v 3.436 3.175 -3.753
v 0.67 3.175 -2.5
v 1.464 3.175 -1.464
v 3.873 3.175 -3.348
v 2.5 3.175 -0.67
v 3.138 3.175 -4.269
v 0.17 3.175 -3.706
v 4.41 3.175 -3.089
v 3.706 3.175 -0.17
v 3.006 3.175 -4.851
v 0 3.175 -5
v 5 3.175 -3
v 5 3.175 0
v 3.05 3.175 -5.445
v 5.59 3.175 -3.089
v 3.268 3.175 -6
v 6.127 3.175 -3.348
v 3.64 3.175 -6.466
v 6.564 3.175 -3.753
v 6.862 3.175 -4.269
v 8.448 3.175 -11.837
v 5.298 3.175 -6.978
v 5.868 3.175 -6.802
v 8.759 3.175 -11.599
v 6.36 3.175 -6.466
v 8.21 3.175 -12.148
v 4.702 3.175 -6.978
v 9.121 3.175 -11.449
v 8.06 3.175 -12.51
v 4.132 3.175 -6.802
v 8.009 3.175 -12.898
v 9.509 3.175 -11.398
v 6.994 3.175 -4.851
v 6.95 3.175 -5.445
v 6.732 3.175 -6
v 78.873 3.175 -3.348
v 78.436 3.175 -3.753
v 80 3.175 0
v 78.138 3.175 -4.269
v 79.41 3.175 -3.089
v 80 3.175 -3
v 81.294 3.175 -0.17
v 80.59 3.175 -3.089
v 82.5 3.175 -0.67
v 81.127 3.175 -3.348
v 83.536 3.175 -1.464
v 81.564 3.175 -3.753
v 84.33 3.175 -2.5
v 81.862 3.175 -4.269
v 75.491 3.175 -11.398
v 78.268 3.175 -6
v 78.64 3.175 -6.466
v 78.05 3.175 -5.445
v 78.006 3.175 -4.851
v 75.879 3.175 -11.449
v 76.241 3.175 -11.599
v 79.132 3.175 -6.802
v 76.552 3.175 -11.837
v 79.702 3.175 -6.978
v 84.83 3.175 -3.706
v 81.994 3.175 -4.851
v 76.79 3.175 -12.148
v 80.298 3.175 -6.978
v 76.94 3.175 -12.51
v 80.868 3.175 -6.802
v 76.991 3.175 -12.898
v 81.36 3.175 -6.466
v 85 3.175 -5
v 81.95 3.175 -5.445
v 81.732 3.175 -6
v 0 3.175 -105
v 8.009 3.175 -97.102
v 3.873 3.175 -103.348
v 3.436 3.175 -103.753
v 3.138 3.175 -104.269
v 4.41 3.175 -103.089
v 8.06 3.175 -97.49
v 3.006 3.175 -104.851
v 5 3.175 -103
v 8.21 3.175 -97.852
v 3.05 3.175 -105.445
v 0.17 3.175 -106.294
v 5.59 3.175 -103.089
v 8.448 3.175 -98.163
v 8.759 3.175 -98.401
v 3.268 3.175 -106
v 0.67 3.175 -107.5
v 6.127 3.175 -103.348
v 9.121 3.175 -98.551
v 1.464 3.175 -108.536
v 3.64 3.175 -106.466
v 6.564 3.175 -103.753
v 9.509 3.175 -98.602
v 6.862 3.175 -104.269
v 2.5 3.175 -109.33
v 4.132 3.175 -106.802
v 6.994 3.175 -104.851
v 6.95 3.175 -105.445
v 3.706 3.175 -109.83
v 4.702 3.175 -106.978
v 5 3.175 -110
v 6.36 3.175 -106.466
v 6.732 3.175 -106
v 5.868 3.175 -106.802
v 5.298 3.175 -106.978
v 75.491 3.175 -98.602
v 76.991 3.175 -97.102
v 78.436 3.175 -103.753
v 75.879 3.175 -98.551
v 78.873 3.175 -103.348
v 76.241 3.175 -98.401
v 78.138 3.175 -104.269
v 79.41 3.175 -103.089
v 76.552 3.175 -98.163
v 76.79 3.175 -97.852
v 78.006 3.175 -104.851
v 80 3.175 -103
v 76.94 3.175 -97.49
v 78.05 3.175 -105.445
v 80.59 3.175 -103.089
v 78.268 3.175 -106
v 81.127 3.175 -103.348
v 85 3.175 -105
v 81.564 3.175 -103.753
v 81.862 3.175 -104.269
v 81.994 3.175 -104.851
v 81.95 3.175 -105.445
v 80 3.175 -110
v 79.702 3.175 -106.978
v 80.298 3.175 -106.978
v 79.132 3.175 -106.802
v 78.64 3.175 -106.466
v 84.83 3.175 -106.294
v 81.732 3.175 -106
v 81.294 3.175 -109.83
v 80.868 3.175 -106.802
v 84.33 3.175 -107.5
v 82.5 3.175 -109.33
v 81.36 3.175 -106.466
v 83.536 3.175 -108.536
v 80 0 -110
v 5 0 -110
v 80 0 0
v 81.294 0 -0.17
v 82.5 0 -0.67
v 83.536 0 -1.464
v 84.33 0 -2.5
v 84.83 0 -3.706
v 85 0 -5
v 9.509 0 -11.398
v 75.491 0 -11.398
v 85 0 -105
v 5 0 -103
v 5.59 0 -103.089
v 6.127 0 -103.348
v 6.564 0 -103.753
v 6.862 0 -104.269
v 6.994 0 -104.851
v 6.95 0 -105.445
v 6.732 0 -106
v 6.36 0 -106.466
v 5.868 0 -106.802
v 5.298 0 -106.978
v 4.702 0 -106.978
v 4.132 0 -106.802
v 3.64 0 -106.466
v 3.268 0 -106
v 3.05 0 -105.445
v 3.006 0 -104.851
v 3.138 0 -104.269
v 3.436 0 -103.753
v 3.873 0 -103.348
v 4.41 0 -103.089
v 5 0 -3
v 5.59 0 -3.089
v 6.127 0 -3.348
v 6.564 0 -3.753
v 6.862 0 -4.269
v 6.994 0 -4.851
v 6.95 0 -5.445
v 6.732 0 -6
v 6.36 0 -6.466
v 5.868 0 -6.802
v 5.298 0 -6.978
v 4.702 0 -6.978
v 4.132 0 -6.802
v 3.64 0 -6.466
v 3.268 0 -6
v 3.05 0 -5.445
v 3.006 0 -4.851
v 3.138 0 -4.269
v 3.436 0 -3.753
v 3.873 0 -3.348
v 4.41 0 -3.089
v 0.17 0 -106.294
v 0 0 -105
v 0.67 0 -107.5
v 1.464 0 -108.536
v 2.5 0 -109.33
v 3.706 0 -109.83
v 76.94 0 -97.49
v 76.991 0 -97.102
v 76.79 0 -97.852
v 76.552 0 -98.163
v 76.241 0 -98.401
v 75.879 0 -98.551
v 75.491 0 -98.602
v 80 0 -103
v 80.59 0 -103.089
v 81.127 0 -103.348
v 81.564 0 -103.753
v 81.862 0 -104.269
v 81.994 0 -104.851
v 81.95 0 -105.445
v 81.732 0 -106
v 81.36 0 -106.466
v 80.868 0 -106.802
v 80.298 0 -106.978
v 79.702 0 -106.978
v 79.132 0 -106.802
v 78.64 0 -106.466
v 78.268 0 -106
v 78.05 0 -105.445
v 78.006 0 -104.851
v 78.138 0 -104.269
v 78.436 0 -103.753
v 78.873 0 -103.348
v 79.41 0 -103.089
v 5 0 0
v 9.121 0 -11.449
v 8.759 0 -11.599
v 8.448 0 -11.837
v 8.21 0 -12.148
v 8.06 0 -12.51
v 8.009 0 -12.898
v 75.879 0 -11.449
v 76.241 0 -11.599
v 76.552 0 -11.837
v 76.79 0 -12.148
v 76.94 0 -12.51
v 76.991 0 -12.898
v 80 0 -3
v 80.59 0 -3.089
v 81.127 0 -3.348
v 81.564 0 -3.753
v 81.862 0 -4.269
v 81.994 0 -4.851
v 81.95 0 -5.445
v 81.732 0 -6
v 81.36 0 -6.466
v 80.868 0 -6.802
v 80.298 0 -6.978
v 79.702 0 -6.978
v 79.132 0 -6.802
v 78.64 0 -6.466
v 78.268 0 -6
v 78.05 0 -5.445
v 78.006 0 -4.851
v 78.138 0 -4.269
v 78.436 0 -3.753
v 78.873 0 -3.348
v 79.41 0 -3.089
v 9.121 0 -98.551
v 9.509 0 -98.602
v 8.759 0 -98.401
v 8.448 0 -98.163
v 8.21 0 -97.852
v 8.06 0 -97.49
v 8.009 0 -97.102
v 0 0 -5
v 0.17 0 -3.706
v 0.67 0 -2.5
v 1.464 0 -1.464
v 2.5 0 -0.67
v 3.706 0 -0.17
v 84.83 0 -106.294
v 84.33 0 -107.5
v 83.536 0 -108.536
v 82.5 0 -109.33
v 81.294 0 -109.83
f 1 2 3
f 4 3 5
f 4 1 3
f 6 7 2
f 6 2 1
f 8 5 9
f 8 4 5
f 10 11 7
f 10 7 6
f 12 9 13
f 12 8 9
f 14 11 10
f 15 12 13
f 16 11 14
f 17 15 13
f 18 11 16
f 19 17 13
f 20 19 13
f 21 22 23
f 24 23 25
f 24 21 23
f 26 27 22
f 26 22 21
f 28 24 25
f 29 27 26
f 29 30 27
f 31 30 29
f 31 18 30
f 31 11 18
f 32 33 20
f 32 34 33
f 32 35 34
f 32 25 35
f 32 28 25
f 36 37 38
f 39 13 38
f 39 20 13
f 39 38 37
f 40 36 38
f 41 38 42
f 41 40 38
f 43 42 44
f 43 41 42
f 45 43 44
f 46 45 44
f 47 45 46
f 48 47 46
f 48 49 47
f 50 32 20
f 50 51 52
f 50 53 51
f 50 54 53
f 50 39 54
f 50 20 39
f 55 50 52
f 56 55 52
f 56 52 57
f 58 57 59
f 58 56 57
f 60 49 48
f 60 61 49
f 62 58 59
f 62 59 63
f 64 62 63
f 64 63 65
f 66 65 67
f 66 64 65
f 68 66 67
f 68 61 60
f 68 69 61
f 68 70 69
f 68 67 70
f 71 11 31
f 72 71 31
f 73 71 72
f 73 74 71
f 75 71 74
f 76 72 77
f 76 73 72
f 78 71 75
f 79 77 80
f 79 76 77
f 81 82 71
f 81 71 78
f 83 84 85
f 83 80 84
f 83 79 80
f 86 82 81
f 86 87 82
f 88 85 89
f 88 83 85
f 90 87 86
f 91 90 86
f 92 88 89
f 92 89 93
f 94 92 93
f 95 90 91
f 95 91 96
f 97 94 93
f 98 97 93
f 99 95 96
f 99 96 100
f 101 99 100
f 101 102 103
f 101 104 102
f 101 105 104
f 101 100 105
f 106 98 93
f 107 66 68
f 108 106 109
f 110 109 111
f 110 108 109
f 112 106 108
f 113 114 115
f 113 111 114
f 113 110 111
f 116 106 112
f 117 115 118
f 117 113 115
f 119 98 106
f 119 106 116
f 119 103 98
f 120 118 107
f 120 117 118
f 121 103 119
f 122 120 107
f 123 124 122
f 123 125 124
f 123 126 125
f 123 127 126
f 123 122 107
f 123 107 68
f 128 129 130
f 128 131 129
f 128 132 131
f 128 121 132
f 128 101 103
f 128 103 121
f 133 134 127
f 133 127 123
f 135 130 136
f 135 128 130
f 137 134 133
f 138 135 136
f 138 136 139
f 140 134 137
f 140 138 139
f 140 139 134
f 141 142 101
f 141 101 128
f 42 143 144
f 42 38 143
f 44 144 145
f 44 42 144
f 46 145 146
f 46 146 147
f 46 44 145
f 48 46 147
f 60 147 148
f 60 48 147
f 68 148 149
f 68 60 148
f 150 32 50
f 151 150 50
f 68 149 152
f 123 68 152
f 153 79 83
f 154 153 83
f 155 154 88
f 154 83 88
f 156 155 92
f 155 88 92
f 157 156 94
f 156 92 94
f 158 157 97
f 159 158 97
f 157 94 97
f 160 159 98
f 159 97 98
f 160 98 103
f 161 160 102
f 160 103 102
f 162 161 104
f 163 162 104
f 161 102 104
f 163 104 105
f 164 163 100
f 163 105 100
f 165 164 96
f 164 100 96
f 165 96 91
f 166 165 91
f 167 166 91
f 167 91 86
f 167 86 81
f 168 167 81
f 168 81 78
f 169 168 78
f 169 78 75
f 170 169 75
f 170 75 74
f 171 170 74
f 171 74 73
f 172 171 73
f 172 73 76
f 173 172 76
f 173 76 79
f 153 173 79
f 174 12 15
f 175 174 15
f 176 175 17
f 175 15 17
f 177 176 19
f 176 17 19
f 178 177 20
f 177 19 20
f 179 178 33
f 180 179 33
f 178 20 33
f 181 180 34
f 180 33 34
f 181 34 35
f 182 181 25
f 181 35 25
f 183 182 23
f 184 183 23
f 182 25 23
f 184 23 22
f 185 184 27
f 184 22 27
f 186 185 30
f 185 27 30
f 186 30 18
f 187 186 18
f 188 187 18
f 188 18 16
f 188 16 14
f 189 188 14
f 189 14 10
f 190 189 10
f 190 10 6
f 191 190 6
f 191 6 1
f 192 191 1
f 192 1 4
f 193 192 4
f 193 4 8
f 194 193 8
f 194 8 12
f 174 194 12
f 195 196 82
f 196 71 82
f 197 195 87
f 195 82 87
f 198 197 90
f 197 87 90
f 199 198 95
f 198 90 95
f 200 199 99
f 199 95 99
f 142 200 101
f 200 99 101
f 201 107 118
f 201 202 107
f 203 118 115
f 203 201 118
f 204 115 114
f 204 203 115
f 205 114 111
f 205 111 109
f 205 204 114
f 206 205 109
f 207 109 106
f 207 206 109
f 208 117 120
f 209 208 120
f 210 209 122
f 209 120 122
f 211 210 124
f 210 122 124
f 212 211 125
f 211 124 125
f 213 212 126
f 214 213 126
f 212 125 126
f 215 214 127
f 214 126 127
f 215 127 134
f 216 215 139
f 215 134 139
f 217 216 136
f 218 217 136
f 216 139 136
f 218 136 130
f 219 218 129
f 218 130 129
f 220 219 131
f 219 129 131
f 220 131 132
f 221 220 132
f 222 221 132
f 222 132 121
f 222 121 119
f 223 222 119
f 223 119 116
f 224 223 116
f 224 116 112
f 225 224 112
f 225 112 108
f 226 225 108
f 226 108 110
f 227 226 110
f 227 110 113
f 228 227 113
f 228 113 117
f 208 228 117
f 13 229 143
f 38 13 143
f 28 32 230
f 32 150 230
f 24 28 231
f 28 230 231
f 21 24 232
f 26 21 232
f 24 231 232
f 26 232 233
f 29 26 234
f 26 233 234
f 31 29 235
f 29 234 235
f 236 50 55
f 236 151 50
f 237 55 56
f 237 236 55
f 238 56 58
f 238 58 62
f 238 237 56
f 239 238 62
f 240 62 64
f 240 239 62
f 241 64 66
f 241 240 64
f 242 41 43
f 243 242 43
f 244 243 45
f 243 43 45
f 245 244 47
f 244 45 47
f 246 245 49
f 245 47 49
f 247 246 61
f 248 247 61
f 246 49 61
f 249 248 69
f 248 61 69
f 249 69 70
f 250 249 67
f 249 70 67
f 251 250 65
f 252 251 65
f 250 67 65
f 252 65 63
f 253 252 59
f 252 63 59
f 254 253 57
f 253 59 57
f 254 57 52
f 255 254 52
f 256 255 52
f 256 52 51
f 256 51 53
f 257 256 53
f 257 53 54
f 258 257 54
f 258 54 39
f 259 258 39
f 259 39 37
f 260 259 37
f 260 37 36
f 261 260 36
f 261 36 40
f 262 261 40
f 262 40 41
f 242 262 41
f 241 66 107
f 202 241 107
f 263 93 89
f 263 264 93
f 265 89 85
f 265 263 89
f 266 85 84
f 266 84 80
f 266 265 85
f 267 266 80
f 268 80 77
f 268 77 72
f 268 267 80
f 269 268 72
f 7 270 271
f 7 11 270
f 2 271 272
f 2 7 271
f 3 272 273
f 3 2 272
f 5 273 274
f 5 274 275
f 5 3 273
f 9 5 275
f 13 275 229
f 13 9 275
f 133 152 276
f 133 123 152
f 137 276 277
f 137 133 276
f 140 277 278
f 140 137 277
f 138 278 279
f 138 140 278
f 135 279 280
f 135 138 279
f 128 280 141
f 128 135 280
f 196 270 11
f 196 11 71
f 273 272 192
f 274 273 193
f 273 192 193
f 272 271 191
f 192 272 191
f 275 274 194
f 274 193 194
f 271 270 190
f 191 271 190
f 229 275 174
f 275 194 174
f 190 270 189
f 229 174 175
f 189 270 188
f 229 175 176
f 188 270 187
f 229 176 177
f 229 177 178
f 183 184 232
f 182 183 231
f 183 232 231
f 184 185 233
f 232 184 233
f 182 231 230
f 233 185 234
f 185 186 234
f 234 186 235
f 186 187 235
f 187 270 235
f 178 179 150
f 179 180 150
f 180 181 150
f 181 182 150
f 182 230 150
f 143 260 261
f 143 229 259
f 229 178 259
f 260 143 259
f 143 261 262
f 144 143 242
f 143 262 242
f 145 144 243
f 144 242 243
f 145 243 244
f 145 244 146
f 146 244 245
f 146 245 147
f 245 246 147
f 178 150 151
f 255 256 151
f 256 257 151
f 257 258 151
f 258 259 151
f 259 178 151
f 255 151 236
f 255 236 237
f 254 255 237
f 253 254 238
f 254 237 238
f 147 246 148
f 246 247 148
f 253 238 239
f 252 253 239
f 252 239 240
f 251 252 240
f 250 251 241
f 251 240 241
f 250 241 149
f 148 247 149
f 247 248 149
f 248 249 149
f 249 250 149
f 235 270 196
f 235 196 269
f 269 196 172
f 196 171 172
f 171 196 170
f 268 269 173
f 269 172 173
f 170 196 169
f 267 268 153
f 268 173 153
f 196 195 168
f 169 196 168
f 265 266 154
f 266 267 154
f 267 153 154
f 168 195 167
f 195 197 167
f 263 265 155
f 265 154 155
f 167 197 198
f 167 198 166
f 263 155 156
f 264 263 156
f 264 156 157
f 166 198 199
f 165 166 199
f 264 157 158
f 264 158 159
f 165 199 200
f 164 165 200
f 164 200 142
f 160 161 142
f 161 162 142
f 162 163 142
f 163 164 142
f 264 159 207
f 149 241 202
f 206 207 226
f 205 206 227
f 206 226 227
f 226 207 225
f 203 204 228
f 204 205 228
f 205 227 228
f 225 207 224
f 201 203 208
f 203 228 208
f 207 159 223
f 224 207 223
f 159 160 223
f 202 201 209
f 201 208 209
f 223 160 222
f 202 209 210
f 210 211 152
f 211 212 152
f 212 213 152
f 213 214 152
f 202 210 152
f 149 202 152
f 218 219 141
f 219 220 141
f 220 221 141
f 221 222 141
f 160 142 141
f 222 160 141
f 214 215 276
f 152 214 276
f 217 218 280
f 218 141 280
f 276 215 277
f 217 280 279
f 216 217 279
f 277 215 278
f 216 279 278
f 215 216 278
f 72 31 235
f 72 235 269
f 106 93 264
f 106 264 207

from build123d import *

# Parameters (mm, degrees)
SKETCH1_W           = 85
SKETCH1_H           = 110
BOSS_EXTRUDE1_DEPTH = 3.175
FILLET1_R           = 5
SKETCH3_W           = 68.982
SKETCH3_H           = 87.204
CUT_EXTRUDE3_DEPTH  = 140.050640506
FILLET2_R           = 1.5
SKETCH5_R           = 2
CUT_EXTRUDE4_DEPTH  = 140.050640506


with BuildPart() as part:
    # Sketch1 → Boss-Extrude1 (new body)
    with BuildSketch(Plane(origin=(0, 0, 0), x_dir=(1, 0, 0), z_dir=(0, 1, 0))):
        with Locations((42.5, 55)):
            Rectangle(SKETCH1_W, SKETCH1_H)
    extrude(amount=BOSS_EXTRUDE1_DEPTH)

    # Fillet1
    fillet1_edges = [part.edges().sort_by_distance(p)[0] for p in [
        (0, 1.5875, -110),
        (85, 1.5875, -110),
        (85, 1.5875, 0),
        (0, 1.5875, 0),
    ]]
    fillet(fillet1_edges, radius=FILLET1_R)

    # Sketch3 → Cut-Extrude3 (cut, through all)
    with BuildSketch(Plane(origin=(0, 3.175, 0), x_dir=(1, 0, 0), z_dir=(0, 1, 0))):
        with Locations((42.5, 55)):
            Rectangle(SKETCH3_W, SKETCH3_H)
    extrude(amount=-CUT_EXTRUDE3_DEPTH, mode=Mode.SUBTRACT)

    # Fillet2
    fillet2_edges = [part.edges().sort_by_distance(p)[0] for p in [
        (76.991, 1.5875, -98.602),
        (76.991, 1.5875, -11.398),
        (8.009, 1.5875, -11.398),
        (8.009, 1.5875, -98.602),
    ]]
    fillet(fillet2_edges, radius=FILLET2_R)

    # Sketch5 → Cut-Extrude4 (cut, through all)
    with BuildSketch(Plane(origin=(0, 3.175, 0), x_dir=(1, 0, 0), z_dir=(0, 1, 0))):
        with Locations(Location((5, 5, 0), (0, 0, 270))):
            Circle(SKETCH5_R)
        with Locations(Location((80, 5, 0), (0, 0, 270))):
            Circle(SKETCH5_R)
        with Locations(Location((80, 105, 0), (0, 0, 270))):
            Circle(SKETCH5_R)
        with Locations(Location((5, 105, 0), (0, 0, 270))):
            Circle(SKETCH5_R)
    extrude(amount=-CUT_EXTRUDE4_DEPTH, mode=Mode.SUBTRACT)


solid = part.part
